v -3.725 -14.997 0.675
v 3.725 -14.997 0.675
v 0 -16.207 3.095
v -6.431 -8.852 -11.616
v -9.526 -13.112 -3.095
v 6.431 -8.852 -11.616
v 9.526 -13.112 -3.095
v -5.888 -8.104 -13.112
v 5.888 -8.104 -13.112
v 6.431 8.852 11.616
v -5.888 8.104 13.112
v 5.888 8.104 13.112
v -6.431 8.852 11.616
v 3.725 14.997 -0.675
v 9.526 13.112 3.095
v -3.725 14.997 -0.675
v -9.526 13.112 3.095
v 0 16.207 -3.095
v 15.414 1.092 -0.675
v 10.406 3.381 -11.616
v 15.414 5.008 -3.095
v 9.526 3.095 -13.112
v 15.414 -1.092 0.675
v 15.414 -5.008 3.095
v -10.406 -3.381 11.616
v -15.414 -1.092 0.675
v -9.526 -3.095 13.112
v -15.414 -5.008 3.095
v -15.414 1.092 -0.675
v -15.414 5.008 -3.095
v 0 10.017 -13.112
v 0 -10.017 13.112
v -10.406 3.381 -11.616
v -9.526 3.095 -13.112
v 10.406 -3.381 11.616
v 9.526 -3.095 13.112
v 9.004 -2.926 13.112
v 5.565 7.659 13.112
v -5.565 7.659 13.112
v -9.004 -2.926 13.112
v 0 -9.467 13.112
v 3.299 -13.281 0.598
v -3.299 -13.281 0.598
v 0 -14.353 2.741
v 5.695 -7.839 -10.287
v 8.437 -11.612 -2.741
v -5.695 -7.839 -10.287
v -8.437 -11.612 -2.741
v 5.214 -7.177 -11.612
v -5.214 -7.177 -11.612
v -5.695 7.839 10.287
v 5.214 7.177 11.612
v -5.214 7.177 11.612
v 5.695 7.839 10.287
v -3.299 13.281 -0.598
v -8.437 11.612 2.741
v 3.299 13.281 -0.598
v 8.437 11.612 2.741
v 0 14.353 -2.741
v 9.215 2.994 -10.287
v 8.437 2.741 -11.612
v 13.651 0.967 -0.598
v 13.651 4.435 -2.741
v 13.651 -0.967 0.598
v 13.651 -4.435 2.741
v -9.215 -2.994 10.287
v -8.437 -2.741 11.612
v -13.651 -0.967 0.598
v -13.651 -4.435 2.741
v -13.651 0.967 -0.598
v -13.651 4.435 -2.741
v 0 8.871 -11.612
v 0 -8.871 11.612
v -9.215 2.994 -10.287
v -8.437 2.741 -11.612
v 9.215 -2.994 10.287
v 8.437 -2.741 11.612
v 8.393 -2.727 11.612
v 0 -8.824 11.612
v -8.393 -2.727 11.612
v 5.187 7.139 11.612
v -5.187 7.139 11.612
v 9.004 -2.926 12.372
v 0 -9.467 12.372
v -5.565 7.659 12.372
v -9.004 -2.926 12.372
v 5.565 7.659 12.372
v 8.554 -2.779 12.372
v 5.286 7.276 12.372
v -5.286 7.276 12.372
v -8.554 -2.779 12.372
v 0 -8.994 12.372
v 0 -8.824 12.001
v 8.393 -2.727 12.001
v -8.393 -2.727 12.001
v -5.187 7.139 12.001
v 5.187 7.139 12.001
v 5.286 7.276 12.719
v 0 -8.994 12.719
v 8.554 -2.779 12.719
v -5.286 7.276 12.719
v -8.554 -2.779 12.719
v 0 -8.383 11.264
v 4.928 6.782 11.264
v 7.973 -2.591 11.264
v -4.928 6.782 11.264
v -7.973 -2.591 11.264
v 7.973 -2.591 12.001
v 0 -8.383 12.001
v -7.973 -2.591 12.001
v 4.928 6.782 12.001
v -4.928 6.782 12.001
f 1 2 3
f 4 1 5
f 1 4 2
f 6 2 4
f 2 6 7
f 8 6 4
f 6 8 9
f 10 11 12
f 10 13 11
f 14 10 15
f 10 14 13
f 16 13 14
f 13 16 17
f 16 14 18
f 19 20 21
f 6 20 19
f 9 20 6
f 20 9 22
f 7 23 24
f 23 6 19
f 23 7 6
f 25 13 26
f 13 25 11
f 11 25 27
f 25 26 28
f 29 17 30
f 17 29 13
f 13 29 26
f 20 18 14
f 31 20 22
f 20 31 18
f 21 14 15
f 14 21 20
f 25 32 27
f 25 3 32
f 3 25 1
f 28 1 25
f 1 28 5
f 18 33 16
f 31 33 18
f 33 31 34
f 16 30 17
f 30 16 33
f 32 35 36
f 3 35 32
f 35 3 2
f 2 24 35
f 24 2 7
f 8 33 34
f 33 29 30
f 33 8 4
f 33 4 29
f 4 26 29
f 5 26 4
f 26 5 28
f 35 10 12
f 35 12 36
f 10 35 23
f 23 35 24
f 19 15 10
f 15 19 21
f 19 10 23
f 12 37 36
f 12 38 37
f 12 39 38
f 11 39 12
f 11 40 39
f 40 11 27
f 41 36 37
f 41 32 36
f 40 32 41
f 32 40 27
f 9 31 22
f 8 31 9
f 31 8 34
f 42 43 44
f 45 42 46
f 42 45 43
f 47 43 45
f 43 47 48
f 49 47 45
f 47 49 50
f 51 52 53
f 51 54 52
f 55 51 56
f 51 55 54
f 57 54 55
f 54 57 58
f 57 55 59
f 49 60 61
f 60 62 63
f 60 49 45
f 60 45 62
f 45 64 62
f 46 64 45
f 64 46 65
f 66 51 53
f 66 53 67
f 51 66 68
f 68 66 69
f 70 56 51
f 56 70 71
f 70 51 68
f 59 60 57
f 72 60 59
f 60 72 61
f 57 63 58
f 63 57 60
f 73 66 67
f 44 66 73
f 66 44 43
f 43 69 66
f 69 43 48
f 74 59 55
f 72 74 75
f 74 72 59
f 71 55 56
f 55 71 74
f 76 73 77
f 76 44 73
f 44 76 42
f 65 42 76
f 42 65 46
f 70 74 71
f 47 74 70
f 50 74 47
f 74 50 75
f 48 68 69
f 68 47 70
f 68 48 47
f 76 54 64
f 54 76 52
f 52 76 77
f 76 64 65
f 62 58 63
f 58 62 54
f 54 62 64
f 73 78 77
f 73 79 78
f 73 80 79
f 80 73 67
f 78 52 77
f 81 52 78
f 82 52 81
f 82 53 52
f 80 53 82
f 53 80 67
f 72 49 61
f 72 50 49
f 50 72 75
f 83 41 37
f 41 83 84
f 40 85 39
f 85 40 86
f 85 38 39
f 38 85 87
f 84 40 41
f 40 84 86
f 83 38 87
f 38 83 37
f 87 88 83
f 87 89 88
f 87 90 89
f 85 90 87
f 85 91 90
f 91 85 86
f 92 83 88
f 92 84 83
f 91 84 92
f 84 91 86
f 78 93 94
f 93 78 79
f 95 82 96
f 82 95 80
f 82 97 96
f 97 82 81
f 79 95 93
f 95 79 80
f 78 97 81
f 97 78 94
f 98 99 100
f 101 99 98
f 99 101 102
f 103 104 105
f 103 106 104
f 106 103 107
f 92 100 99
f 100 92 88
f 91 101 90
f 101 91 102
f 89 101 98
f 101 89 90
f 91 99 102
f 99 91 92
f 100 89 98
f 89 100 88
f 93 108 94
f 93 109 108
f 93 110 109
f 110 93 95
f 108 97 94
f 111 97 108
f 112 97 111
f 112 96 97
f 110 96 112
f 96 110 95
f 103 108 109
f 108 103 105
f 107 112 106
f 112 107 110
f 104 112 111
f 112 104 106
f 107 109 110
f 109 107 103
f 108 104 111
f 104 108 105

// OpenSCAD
hauteurExt = 26.224;
epaisseurParoi = 1.5;
diametreTrouBouchon = 1.6;
r = 0.19; // résolution d'impression sur l'axe Z
echelleReductionAjustementBouchon = 0.95;
hauteurInt = hauteurExt - 2 * epaisseurParoi;

render(convexity=2) 

//dode_creux();
//decoupe_bouchon();
corps_ouvert();
//bouchon_avec_attache();
bouchon();
//bouchon_trou();

module corps_ouvert() {
	difference() {
		dode_creux();
		decoupe_bouchon();
	}
}

module bouchon_avec_attache() {
	scale([echelleReductionAjustementBouchon, echelleReductionAjustementBouchon, 0.97])
	union () {
		intersection() {
			dode_creux();
			decoupe_bouchon();
		}
		translate([0, 0, hauteurExt/2])
		rotate([90, 0, 54])
		rotate_extrude(convexity = 10, $fn=40)
		translate([1, 0, 0])
		circle(r = 0.5, $fn=40);
	}
}

module bouchon_trou() {
	scale([echelleReductionAjustementBouchon, echelleReductionAjustementBouchon, 1])
	difference () {
		intersection() {
			dode_creux();
			decoupe_bouchon();
		}
		translate([0, 0, hauteurExt/2.5])
		cylinder(30, r=diametreTrouBouchon/2, $fn=22);
	}
}

module bouchon() {
//    rotate([0,180,0])
	scale([echelleReductionAjustementBouchon, echelleReductionAjustementBouchon, 0.97])
	difference () {
		intersection() {
			dode_creux();
			decoupe_bouchon();
		}
	}
}

module dode_creux() {
	difference() {
		dodecahedron(hauteurExt);
		dodecahedron(hauteurInt);
	}
}

module decoupe_bouchon() {
    distance = hauteurInt/2+4*r;
	rotate([0,0,54]) translate([0,0,distance])
		cylinder(epaisseurParoi, r=hauteurExt/2.77, $fn=5);
	rotate([0,0,54]) translate([0,0,distance-epaisseurParoi])
		cylinder(epaisseurParoi, r=hauteurExt/2.54-epaisseurParoi, $fn=5);
}

module dodecahedron(height) {
	scale([height,height,height]) {
		intersection() {
			cube([2,2,1], center = true); 
			intersection_for(i=[0:4]) { 
				rotate([0,0,72*i])
				rotate([116.565,0,0])
					cube([2,2,1], center = true); 
			}
		}
	}
}
